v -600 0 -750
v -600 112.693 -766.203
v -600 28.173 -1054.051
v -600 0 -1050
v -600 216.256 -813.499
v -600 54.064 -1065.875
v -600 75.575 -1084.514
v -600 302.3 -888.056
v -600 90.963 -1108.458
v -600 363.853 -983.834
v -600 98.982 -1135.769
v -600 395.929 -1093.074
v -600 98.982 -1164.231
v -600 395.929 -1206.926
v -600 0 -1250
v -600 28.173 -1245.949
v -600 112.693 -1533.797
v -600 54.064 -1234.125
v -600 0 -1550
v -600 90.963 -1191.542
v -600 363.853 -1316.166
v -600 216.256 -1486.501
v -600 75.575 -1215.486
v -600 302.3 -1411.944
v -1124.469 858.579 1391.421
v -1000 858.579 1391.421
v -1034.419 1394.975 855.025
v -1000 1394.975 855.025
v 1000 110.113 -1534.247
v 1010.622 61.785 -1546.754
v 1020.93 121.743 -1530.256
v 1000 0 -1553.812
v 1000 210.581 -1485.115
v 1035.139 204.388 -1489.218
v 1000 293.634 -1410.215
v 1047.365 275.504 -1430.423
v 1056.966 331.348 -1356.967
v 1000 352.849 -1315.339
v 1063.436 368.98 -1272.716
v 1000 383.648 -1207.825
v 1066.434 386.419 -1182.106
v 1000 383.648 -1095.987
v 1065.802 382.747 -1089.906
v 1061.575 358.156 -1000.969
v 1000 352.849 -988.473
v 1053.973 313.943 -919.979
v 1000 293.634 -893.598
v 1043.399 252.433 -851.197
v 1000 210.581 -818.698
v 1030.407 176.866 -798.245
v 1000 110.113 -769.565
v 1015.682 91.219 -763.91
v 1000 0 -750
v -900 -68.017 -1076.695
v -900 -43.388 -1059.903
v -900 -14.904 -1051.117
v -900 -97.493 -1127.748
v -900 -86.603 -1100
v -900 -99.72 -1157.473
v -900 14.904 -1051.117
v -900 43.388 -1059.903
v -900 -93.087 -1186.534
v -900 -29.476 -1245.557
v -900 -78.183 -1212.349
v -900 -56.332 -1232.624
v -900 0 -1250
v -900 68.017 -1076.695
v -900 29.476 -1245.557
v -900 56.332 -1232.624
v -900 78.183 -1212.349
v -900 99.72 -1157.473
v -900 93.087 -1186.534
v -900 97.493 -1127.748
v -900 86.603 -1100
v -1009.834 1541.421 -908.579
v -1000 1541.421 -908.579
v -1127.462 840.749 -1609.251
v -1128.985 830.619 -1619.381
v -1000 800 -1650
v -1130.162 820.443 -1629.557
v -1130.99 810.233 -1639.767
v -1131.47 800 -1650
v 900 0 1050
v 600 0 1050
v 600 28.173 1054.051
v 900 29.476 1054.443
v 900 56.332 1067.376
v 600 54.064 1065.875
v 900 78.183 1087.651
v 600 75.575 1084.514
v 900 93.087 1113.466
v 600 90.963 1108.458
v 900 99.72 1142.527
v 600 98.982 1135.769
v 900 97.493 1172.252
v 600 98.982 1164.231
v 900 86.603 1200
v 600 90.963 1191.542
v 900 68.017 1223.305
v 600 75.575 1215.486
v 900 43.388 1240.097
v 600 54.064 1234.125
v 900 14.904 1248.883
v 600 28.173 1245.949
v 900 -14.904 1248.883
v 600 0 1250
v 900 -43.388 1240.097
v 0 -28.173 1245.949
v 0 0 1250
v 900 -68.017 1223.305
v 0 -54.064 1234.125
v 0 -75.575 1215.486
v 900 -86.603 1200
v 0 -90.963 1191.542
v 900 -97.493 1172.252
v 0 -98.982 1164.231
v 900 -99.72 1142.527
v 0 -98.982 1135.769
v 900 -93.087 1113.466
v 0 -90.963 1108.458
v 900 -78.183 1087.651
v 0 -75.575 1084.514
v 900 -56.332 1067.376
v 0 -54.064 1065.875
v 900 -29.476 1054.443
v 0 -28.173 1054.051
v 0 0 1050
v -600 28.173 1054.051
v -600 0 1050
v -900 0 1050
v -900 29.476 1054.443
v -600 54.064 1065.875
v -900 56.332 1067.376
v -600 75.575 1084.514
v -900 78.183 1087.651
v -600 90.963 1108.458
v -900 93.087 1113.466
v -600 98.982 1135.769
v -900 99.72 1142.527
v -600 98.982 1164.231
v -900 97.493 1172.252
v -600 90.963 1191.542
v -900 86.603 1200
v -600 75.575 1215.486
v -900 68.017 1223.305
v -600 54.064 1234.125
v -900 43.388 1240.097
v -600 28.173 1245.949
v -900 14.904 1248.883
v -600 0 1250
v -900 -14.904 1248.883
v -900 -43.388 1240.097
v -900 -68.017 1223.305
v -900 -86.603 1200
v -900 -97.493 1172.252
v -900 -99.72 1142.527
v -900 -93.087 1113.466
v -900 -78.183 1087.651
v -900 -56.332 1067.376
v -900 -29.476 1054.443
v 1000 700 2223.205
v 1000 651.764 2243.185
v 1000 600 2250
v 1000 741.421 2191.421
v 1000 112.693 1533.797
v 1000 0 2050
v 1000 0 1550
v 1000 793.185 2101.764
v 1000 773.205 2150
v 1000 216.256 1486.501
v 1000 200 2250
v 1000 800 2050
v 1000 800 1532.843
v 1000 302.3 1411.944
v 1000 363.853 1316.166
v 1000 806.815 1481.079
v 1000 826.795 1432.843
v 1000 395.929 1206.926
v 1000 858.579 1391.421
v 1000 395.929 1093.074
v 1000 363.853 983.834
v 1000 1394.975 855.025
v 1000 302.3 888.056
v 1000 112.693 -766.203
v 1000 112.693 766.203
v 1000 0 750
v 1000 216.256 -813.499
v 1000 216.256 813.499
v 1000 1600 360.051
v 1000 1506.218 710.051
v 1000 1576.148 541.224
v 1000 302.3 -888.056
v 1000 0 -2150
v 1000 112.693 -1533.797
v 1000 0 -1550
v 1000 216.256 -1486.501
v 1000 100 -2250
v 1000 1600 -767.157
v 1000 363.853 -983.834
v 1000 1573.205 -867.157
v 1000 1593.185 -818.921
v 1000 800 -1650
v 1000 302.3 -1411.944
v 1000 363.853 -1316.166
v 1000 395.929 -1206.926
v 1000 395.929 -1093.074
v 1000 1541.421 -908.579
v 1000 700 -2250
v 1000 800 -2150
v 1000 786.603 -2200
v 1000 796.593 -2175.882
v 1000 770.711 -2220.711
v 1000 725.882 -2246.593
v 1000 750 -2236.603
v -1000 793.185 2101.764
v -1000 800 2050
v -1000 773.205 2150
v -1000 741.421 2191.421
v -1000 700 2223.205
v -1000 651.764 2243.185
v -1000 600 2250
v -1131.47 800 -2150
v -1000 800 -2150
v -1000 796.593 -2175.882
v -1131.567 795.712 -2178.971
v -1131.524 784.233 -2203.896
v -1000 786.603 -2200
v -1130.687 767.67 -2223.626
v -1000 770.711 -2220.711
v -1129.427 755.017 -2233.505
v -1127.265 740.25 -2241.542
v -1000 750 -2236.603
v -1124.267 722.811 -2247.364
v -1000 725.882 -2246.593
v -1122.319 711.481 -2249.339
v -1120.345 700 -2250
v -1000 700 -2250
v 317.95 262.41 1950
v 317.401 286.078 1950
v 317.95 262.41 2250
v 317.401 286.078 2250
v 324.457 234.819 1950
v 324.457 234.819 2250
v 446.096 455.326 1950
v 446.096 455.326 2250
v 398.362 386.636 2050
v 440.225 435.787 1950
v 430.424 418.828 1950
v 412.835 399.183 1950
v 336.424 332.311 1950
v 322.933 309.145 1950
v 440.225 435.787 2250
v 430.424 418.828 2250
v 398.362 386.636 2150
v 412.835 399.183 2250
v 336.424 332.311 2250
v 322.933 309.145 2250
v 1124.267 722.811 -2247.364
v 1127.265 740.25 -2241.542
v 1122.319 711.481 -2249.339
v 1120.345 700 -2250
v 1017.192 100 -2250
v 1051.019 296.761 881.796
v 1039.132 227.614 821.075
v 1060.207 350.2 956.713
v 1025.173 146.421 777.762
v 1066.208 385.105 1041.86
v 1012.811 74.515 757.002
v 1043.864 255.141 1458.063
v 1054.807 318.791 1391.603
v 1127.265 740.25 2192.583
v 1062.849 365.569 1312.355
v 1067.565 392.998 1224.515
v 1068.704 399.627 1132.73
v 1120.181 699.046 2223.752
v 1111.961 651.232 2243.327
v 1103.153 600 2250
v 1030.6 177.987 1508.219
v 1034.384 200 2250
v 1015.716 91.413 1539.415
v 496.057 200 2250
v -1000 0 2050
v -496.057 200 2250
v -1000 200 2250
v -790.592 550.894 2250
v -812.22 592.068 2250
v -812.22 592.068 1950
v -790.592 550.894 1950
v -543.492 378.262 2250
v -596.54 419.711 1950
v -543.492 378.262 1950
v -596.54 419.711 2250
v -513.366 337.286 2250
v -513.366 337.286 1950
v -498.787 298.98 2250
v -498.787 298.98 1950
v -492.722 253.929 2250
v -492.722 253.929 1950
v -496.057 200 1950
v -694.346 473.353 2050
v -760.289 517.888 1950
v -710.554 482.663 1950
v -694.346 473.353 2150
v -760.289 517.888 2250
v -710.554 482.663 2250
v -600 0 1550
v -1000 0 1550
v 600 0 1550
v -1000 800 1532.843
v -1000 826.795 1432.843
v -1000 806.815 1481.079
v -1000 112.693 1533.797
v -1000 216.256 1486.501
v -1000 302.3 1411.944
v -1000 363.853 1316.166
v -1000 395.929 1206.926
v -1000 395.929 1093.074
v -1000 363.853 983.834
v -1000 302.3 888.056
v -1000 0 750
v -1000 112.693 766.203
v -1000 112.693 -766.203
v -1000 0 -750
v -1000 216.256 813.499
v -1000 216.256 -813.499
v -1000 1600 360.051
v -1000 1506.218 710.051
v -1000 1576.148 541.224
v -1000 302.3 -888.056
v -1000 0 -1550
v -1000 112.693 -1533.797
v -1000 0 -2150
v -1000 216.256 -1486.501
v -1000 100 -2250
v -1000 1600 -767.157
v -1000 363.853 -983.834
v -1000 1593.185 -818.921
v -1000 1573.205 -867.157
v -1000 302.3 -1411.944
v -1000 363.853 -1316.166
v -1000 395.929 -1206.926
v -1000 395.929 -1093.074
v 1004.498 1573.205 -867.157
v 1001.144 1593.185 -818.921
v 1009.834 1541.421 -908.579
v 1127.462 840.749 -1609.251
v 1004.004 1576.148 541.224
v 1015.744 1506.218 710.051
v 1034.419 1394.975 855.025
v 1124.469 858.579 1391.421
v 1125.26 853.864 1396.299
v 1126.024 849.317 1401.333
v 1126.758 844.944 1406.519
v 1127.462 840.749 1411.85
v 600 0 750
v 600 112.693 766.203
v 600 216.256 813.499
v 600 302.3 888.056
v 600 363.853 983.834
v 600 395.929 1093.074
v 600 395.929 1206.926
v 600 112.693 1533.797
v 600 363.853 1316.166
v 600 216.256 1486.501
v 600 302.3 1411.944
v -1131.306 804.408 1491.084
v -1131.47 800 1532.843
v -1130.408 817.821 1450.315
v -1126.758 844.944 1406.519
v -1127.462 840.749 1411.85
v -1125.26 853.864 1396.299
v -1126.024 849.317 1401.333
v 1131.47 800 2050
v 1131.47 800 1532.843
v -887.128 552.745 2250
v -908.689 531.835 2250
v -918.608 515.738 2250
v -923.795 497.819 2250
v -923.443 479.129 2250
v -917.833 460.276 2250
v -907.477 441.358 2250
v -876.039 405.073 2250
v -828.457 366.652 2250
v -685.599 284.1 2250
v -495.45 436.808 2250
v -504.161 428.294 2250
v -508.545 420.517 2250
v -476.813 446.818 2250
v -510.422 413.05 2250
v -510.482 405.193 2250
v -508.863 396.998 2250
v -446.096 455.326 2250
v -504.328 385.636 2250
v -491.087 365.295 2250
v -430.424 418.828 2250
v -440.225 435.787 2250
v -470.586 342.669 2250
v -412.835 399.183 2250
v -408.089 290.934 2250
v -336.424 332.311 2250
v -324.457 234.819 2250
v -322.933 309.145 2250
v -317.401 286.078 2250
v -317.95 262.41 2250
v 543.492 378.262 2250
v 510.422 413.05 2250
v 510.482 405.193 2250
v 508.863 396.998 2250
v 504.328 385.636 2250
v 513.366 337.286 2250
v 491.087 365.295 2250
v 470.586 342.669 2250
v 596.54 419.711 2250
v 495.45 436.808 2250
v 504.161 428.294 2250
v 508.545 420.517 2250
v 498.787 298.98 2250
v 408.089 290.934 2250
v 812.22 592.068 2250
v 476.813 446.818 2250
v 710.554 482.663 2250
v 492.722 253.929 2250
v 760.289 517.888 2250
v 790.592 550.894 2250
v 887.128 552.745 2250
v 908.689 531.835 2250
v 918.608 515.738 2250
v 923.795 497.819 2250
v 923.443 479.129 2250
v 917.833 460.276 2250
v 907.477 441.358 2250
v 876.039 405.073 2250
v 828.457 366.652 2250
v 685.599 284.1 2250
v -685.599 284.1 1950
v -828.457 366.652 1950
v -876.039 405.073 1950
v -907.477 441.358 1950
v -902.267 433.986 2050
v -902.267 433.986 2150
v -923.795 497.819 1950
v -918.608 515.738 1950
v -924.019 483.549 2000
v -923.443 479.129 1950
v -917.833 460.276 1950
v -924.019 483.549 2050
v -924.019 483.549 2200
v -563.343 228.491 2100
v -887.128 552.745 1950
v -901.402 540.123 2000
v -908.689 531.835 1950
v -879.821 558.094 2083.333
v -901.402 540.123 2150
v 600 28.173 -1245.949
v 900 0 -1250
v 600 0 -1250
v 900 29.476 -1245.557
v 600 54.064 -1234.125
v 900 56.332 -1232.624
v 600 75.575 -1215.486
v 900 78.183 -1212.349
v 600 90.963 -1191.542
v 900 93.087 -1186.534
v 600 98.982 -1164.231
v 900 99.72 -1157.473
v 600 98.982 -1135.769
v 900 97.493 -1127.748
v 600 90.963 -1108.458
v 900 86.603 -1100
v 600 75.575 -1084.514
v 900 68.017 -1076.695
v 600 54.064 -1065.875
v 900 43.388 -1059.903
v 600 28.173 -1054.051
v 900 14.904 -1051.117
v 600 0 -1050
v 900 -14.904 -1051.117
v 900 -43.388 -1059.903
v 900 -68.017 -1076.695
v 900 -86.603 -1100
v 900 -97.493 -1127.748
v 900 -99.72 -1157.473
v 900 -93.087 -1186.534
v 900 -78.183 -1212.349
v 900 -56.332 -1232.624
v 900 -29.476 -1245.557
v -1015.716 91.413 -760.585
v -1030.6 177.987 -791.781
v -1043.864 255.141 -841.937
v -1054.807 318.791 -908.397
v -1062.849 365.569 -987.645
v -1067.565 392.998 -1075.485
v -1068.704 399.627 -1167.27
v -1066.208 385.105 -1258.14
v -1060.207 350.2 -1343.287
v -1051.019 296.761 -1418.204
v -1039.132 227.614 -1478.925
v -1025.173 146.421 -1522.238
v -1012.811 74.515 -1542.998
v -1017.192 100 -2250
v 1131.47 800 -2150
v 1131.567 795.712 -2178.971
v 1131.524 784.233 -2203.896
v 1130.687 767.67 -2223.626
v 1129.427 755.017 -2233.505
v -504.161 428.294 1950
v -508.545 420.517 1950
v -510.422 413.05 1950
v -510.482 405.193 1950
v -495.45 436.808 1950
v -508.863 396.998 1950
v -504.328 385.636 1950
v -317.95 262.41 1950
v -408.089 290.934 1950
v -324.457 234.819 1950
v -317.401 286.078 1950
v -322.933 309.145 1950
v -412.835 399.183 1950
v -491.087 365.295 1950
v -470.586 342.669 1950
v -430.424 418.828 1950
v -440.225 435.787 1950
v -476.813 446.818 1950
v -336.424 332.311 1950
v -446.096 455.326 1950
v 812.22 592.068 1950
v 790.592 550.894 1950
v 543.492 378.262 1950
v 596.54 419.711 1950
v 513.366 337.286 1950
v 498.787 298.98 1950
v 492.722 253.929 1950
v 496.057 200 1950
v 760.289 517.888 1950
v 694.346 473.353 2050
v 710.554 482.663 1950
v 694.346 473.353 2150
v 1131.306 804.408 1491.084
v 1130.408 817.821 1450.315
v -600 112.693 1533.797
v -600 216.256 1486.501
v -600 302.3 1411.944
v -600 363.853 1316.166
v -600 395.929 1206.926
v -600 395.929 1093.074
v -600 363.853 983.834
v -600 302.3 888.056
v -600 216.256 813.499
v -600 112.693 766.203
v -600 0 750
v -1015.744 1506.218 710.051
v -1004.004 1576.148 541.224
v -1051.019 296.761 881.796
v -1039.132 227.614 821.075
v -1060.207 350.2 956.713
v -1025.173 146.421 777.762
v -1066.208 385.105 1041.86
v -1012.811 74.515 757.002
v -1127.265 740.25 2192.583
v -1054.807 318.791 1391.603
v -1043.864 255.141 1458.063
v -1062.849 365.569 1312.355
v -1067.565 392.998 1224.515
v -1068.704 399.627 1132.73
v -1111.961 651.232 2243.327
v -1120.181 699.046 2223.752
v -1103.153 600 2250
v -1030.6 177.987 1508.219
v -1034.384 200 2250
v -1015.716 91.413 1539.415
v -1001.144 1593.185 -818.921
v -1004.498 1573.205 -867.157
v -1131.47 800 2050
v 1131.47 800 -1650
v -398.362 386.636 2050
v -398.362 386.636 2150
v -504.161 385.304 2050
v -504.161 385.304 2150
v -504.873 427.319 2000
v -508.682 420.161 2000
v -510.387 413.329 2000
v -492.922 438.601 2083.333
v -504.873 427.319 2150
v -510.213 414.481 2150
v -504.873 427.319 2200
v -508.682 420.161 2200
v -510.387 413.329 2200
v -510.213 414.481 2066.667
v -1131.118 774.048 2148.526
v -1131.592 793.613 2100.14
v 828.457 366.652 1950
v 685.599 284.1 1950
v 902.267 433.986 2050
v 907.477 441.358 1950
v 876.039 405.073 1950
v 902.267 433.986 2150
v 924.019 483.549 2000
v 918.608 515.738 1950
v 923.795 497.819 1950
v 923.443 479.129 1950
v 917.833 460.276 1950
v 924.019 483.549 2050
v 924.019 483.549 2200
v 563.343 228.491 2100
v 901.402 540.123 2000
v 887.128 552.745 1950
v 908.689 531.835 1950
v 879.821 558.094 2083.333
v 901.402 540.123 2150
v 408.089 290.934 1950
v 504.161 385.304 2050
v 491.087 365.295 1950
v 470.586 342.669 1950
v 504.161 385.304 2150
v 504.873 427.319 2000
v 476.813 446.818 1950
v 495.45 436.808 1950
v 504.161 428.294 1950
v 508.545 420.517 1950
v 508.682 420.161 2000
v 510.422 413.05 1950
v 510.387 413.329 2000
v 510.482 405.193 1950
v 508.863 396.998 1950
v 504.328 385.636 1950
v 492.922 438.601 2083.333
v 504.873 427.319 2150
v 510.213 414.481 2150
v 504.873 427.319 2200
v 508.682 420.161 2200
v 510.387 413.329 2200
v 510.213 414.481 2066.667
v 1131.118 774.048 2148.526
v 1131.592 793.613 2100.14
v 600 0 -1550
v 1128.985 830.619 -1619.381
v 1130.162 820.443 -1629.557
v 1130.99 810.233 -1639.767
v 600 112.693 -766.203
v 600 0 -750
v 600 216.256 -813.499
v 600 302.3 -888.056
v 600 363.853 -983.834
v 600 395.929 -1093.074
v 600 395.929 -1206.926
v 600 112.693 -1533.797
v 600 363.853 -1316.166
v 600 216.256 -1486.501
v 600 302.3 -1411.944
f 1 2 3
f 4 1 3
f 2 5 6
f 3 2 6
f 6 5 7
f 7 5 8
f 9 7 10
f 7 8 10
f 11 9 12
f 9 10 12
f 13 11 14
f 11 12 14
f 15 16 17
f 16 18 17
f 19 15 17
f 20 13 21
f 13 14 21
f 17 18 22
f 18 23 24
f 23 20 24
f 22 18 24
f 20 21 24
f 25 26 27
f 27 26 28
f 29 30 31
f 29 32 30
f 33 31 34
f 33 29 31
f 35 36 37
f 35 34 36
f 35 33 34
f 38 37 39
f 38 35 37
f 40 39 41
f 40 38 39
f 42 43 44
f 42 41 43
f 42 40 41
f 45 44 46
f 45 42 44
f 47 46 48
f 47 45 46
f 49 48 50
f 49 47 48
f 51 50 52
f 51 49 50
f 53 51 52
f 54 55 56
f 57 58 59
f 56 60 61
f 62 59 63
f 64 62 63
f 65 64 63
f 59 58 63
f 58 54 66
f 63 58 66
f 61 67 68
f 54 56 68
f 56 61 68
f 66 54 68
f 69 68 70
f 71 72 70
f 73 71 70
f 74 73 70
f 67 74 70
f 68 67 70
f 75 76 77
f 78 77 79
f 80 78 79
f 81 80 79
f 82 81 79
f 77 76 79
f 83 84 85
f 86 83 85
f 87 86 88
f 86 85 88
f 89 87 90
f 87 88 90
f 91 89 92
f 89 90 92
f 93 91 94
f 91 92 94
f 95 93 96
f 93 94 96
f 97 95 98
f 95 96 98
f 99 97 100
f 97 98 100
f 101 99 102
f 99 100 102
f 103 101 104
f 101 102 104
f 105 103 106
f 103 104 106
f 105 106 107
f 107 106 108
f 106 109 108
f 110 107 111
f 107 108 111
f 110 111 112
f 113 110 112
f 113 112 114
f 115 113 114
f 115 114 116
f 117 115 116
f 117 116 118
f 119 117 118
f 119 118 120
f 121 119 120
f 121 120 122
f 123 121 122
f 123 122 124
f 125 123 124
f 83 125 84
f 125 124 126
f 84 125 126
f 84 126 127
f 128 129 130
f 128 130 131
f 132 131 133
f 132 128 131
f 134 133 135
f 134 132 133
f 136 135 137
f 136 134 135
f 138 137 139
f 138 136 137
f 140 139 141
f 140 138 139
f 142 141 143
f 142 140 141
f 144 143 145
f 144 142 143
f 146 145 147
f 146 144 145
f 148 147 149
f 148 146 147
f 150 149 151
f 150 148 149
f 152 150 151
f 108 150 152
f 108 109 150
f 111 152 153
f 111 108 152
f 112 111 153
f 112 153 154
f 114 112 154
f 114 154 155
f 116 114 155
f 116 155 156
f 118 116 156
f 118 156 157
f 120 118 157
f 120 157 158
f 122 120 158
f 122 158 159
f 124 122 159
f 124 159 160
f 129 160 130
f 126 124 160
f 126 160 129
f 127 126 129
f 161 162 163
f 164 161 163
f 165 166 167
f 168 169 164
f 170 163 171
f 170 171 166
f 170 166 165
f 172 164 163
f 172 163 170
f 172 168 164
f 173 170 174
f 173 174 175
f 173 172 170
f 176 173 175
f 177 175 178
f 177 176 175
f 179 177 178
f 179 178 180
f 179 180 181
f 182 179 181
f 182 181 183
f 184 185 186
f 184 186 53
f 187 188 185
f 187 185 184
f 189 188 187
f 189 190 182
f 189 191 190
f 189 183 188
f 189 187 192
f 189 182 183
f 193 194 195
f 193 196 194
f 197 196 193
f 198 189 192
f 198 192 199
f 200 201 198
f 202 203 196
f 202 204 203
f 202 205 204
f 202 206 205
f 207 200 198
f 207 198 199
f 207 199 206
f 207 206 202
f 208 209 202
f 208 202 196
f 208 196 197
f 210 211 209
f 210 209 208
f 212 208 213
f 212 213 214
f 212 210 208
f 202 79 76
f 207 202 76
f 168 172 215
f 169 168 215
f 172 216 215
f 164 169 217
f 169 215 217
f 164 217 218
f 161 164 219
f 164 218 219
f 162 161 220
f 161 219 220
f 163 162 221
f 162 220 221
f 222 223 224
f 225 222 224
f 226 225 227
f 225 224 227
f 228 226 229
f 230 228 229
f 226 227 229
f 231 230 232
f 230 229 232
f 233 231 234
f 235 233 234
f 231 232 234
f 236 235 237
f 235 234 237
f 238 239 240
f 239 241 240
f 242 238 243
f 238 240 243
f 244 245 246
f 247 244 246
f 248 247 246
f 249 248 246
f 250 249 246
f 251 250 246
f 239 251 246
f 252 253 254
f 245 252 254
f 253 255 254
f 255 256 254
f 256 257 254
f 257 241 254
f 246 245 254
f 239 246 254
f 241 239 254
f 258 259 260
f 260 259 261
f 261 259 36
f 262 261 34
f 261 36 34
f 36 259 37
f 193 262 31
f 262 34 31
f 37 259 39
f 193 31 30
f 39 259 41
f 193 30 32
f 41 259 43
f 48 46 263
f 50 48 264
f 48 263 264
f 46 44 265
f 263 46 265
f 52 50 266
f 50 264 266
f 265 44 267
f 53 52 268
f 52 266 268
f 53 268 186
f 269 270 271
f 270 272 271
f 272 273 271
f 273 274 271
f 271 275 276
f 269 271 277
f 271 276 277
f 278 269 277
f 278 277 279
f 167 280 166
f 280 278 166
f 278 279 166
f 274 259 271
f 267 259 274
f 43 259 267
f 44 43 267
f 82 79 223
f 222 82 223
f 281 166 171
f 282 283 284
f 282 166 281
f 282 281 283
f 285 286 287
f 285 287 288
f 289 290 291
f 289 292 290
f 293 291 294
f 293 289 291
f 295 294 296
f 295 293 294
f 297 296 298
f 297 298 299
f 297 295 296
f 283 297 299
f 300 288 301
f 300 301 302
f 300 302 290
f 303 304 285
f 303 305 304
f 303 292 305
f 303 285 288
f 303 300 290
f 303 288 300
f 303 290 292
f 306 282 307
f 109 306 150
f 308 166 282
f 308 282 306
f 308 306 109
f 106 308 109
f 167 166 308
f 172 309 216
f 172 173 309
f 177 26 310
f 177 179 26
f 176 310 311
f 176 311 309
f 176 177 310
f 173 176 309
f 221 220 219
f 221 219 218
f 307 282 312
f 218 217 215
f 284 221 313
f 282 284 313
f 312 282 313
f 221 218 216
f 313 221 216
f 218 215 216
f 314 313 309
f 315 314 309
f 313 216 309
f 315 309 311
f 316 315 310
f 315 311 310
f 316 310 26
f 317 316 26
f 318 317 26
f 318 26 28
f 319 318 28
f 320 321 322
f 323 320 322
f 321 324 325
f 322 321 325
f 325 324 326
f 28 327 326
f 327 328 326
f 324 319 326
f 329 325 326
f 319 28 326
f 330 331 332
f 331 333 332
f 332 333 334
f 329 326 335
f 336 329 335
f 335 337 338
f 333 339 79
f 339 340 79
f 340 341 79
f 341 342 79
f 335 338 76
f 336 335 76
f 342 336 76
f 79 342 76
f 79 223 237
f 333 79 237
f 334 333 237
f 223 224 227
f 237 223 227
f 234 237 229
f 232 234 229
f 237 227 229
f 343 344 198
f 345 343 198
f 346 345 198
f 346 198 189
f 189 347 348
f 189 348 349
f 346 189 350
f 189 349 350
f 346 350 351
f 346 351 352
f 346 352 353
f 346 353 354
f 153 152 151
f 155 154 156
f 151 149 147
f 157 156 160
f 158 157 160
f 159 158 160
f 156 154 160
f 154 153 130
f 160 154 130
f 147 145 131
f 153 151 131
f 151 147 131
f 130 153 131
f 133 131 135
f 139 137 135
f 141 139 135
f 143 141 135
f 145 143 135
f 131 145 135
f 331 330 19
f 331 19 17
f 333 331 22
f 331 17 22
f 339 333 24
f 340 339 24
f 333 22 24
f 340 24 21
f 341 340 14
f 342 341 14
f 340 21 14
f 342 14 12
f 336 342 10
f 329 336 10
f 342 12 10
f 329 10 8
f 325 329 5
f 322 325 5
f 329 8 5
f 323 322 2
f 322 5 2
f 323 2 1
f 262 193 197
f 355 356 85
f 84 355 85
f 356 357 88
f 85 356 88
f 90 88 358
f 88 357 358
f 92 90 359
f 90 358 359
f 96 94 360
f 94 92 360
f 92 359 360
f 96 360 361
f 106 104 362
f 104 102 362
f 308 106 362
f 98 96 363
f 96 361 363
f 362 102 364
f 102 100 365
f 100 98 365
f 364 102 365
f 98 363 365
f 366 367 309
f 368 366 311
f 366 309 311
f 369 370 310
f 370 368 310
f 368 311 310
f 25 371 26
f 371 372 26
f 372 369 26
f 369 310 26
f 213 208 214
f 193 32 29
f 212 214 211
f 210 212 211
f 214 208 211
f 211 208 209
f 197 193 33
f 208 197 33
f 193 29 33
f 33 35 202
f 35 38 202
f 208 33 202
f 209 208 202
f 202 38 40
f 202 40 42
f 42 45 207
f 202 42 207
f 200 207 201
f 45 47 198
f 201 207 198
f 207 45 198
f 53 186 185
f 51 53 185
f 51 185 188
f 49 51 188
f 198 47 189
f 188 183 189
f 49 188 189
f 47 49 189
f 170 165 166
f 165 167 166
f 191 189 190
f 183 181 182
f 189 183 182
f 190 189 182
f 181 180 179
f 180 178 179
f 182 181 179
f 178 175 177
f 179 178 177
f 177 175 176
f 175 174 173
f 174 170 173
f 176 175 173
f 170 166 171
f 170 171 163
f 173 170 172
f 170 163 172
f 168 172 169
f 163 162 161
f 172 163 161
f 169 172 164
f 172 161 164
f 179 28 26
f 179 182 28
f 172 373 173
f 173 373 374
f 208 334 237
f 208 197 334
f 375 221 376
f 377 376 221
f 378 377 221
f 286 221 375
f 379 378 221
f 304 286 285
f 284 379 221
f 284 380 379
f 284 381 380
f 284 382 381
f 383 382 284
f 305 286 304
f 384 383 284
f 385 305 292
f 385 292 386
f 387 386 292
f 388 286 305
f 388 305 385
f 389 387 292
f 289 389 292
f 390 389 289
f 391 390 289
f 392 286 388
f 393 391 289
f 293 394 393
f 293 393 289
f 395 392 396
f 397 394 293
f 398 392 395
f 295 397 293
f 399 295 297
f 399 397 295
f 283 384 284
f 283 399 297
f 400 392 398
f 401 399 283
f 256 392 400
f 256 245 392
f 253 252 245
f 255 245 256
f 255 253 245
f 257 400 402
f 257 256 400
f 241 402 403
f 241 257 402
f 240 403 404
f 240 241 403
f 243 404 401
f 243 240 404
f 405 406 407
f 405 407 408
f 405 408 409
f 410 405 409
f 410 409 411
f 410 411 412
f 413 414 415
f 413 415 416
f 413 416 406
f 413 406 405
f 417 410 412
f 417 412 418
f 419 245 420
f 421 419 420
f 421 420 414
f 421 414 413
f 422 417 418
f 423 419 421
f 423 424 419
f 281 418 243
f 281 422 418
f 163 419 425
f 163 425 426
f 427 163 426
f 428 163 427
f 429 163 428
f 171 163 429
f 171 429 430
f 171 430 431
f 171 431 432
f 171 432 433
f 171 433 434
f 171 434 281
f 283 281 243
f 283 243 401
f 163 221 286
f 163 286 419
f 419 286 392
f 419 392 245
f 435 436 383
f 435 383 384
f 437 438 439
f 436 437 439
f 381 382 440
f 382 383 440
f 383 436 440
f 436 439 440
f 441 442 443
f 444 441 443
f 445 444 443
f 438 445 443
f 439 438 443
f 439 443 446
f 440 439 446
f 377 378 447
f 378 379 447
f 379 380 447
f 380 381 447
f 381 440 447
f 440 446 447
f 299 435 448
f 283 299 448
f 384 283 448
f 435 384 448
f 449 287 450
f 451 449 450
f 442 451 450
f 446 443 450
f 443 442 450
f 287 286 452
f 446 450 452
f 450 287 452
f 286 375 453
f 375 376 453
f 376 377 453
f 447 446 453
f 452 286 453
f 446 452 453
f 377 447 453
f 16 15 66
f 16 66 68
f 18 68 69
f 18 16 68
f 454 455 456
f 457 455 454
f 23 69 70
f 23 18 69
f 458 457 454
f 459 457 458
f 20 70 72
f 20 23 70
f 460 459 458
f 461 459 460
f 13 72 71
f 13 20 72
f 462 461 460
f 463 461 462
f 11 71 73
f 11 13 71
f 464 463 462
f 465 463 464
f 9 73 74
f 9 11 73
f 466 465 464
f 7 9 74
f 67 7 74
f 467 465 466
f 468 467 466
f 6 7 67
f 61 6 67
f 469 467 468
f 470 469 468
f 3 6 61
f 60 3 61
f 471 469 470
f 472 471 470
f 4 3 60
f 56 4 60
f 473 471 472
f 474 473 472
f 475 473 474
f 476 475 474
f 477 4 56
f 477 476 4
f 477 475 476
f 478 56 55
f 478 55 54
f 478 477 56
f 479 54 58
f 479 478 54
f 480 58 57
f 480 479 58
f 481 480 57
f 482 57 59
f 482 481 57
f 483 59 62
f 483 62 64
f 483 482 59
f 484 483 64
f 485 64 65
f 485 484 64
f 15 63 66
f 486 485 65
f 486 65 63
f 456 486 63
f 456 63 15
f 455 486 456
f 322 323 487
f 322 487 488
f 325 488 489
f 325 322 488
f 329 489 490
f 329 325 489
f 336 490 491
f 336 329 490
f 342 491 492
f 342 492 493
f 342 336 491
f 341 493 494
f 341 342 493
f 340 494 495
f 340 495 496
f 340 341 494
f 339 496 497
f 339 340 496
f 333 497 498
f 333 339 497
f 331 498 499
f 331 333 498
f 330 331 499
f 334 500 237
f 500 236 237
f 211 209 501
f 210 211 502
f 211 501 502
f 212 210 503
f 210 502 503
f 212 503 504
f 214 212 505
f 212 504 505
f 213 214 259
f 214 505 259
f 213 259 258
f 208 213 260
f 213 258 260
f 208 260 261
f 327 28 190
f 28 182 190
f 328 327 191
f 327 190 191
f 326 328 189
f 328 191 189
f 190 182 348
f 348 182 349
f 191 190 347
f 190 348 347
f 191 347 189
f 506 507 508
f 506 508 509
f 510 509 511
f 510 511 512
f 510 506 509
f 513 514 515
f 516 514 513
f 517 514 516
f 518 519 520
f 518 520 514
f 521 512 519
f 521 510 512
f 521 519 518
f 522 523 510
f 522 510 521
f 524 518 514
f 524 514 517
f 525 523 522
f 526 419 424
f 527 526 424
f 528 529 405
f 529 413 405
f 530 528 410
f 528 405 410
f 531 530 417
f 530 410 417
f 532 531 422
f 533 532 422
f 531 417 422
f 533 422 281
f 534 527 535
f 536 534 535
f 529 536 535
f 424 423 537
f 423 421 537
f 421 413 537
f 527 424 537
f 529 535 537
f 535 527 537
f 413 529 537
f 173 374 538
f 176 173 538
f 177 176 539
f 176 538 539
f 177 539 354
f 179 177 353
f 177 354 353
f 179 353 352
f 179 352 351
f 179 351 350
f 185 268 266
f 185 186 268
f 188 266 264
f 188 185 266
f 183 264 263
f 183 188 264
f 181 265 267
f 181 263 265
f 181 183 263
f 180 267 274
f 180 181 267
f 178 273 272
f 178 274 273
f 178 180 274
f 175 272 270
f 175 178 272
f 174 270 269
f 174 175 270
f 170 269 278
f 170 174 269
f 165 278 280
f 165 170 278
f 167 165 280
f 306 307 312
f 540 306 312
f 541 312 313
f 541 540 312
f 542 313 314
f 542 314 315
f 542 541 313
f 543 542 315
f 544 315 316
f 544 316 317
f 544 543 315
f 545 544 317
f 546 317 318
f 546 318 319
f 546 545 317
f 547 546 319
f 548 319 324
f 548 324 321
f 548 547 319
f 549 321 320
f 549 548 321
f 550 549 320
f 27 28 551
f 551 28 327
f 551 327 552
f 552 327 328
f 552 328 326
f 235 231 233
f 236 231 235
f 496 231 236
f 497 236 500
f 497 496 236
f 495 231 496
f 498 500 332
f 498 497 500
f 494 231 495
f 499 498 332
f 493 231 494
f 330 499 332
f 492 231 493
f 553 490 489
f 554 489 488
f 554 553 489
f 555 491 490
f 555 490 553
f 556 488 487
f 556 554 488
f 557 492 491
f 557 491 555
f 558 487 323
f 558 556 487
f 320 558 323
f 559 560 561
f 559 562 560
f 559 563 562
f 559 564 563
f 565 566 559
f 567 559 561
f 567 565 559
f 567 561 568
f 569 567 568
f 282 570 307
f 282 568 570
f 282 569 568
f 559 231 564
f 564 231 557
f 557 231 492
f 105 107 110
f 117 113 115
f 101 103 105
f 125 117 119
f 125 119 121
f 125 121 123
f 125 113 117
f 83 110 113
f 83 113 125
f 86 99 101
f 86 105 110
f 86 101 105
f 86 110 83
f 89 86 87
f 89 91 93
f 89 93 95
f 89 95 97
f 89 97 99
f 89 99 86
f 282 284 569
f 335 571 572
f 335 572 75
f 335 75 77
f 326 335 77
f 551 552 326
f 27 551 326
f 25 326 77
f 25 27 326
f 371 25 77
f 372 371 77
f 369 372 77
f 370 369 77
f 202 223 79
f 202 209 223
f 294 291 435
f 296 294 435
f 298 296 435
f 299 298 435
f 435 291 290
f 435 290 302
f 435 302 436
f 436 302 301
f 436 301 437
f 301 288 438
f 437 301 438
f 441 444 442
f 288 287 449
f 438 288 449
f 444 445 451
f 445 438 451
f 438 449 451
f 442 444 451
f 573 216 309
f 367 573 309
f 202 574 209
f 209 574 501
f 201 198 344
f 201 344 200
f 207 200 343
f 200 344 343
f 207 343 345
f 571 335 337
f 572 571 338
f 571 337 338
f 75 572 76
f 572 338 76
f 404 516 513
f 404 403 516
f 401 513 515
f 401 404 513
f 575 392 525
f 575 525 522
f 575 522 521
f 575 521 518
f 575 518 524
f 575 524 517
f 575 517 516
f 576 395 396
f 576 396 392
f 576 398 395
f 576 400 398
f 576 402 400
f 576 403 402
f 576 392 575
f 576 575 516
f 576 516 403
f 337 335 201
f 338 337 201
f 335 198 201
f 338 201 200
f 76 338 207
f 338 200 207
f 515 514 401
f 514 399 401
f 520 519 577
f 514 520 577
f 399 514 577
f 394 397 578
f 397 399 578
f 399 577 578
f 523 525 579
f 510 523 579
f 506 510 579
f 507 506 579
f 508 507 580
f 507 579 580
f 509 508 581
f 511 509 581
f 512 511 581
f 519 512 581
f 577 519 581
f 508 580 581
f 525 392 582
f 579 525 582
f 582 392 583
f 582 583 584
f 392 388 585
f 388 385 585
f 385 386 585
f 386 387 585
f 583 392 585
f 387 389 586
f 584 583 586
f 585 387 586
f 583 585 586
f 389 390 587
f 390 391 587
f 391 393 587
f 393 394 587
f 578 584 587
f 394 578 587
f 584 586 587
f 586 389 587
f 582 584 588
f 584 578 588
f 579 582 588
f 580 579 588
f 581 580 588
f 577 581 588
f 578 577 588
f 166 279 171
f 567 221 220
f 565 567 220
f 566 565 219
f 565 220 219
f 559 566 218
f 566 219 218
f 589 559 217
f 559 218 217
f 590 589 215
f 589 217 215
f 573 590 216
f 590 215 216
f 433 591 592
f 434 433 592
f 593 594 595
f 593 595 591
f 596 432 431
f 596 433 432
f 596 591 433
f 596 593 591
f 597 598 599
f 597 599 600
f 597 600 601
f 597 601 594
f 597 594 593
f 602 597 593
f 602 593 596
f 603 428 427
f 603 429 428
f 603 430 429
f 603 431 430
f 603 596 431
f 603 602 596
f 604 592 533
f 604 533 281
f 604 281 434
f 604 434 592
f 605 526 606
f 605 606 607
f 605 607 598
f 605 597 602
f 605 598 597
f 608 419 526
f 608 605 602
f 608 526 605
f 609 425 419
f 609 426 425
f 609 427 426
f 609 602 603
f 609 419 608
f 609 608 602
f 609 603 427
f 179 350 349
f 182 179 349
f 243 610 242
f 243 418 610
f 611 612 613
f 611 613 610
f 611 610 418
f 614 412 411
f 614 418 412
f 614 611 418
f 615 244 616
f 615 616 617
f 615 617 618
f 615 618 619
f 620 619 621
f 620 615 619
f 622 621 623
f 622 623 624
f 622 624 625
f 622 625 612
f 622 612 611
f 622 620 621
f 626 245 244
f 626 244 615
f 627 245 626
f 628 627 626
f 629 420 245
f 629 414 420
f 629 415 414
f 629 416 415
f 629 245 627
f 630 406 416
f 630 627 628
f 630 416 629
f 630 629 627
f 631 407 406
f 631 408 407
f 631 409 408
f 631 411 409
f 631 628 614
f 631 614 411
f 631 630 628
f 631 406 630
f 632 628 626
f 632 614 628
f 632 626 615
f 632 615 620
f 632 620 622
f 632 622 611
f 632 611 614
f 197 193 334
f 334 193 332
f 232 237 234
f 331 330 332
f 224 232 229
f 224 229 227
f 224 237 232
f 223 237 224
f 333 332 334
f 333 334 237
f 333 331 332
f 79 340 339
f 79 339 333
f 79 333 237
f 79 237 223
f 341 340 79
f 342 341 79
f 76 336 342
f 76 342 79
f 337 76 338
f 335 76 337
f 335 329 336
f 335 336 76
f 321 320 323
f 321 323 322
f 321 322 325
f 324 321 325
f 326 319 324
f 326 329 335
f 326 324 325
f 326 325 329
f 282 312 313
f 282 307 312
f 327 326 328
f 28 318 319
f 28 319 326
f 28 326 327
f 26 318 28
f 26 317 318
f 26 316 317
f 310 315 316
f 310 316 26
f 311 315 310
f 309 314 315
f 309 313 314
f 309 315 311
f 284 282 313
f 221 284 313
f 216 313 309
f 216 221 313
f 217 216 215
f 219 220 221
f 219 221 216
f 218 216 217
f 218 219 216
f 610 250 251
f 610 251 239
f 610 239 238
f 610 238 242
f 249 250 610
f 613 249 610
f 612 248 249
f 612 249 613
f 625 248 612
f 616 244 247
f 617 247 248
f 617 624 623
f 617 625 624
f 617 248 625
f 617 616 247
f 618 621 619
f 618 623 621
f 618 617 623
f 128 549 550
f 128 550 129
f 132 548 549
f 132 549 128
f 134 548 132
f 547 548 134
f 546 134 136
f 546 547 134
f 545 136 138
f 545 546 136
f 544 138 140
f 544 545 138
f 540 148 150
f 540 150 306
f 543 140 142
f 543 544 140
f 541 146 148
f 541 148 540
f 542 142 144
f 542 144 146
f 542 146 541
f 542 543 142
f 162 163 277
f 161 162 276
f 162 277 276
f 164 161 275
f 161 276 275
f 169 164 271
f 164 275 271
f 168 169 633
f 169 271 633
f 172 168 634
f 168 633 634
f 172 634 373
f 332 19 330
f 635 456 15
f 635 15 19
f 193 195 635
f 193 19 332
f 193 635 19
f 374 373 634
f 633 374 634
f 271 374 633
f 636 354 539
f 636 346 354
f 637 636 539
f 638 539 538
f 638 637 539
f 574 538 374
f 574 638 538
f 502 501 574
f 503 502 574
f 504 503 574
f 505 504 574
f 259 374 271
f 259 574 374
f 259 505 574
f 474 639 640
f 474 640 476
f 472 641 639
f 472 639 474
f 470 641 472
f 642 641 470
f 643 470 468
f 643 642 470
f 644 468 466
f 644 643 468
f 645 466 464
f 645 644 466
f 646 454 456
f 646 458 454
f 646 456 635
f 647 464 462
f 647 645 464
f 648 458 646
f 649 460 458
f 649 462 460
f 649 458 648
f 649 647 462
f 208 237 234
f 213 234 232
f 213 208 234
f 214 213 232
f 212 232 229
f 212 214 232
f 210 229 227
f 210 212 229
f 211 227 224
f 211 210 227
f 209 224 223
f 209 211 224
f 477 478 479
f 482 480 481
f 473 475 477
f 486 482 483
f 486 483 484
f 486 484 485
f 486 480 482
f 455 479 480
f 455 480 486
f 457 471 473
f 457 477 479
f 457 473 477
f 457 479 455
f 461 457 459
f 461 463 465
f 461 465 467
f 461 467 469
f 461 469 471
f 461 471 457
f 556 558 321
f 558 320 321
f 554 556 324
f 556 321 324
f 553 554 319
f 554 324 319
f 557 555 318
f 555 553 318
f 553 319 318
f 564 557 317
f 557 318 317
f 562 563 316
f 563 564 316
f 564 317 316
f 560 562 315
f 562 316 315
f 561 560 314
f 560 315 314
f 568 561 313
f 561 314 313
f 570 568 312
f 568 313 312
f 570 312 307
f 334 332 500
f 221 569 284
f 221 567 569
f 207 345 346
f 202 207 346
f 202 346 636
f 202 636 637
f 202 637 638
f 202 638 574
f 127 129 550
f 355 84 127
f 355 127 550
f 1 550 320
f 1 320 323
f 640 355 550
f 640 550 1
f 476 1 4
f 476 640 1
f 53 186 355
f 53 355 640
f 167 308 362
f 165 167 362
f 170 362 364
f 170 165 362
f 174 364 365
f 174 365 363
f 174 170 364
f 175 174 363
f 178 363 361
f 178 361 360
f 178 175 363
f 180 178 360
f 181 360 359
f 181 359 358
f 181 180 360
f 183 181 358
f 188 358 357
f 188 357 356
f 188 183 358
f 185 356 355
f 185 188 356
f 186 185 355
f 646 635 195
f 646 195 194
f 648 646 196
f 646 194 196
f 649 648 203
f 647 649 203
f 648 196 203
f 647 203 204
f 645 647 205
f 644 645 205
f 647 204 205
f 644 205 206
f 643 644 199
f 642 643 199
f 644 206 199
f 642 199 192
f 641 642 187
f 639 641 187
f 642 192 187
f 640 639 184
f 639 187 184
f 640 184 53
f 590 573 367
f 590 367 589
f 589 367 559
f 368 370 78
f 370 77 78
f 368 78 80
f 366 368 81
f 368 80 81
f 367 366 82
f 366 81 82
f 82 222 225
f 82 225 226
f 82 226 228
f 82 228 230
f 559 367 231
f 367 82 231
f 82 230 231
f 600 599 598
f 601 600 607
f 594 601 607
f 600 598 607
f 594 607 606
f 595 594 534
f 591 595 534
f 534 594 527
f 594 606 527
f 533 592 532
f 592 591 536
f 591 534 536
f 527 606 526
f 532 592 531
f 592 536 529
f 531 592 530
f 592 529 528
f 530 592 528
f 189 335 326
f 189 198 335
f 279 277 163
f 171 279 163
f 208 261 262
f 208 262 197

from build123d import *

# Parameters (mm, degrees)
BOSS_EXTRUDE1_DEPTH     = 1000
FILLET1_R               = 700
FILLET2_R               = 200
FILLET3_R               = 200
FILLET4_R               = 200
CHAMFER1_SIZE           = 200
FILLET5_R               = 100
CHAMFER2_SIZE           = 100
CUT_EXTRUDE3_DEPTH      = 400
CUT_EXTRUDE4_START      = -400
CUT_EXTRUDE4_DEPTH      = 400
SKETCH7_R               = 100
BOSS_EXTRUDE2_DEPTH     = 900
CUT_EXTRUDE6_DEPTH      = 300
BOSS_EXTRUDE3_DEPTH     = 4500
BOSS_EXTRUDE3_2_DEPTH   = 4500
CUT_EXTRUDE7_DEPTH      = 3491.640611961
CUT_EXTRUDE7_DEPTH_BACK = 3491.640611961
FILLET6_R               = 300
FILLET7_R               = 300
CUT_EXTRUDE8_DEPTH      = 3489.01206024
CUT_EXTRUDE9_DEPTH      = 3489.01206024


with BuildPart() as part:
    # Car_Profile → Boss-Extrude1 (new, symmetric)
    with BuildSketch(Plane(origin=(0, 0, 0), x_dir=(0, 0, -1), z_dir=(1, 0, 0))):
        Polygon((2250, 0), (2250, 800), (1650, 800), (850, 1600), (-650, 1600), (-1450, 800), (-2250, 800), (-2250, 0), align=None)
    extrude(amount=BOSS_EXTRUDE1_DEPTH, both=True)

    # Fillet1
    fillet1_edges = [part.edges().sort_by_distance(p)[0] for p in [
        (0, 1600, 650),
    ]]
    fillet(fillet1_edges, radius=FILLET1_R)

    # Fillet2
    fillet2_edges = [part.edges().sort_by_distance(p)[0] for p in [
        (0, 1600, -850),
    ]]
    fillet(fillet2_edges, radius=FILLET2_R)

    # Fillet3
    fillet3_edges = [part.edges().sort_by_distance(p)[0] for p in [
        (0, 800, 1450),
    ]]
    fillet(fillet3_edges, radius=FILLET3_R)

    # Fillet4
    fillet4_edges = [part.edges().sort_by_distance(p)[0] for p in [
        (0, 800, 2250),
    ]]
    fillet(fillet4_edges, radius=FILLET4_R)

    # Chamfer1
    chamfer1_edges = [part.edges().sort_by_distance(p)[0] for p in [
        (0, 0, 2250),
    ]]
    chamfer(chamfer1_edges, length=CHAMFER1_SIZE)

    # Fillet5
    fillet5_edges = [part.edges().sort_by_distance(p)[0] for p in [
        (0, 800, -2250),
    ]]
    fillet(fillet5_edges, radius=FILLET5_R)

    # Chamfer2
    chamfer2_edges = [part.edges().sort_by_distance(p)[0] for p in [
        (0, 0, -2250),
    ]]
    chamfer(chamfer2_edges, length=CHAMFER2_SIZE)

    # Sketch4 → Cut-Extrude3 (cut)
    with BuildSketch(Plane(origin=(1000, 0, 0), x_dir=(0, 0, -1), z_dir=(1, 0, 0))):
        with BuildLine():
            Line((-750, 0), (-1550, 0))
            ThreePointArc((-1550, 0), (-1150, 400), (-750, 0))
        make_face()
        with BuildLine():
            Line((750, 0), (1550, 0))
            ThreePointArc((1550, 0), (1150, 400), (750, 0))
        make_face()
    extrude(amount=-CUT_EXTRUDE3_DEPTH, mode=Mode.SUBTRACT)

    # Sketch6 → Cut-Extrude4 (cut)
    with BuildSketch(Plane.ZY.offset(1000).offset(CUT_EXTRUDE4_START)):
        with BuildLine():
            Line((-750, 0), (-1550, 0))
            ThreePointArc((-1550, 0), (-1150, 400), (-750, 0))
        make_face()
        with BuildLine():
            Line((750, 0), (1550, 0))
            ThreePointArc((1550, 0), (1150, 400), (750, 0))
        make_face()
    extrude(amount=CUT_EXTRUDE4_DEPTH, mode=Mode.SUBTRACT)

    # Sketch7 → Boss-Extrude2 (add, symmetric)
    with BuildSketch(Plane(origin=(0, 0, 0), x_dir=(0, 0, -1), z_dir=(1, 0, 0))):
        with Locations((-1150, 0)):
            Circle(SKETCH7_R)
        with Locations((1150, 0)):
            Circle(SKETCH7_R)
    extrude(amount=BOSS_EXTRUDE2_DEPTH, both=True)

    # Sketch3 → Cut-Extrude6 (cut)
    with BuildSketch(Plane.XY.offset(2250)):
        with BuildLine():
            add(Edge.make_bspline(
                [(-812.220424377, 592.068401543), (-750.671179112, 420.314312551), (-457.577758575, 466.704189274), (-496.056589451, 200)],
                knots=[0, 0, 0, 0, 1, 1, 1, 1], degree=3))
            add(Edge.make_bspline(
                [(-812.220424377, 592.068401543), (-1175.602480819, 453.360293498), (-543.357650564, 223.458106016), (-496.056589451, 200)],
                knots=[0, 0, 0, 0, 1, 1, 1, 1], degree=3))
        make_face()
        with BuildLine():
            add(Edge.make_bspline(
                [(-446.096477938, 455.326051812), (-637.070416277, 418.575957657), (-345.711658908, 250.477148017), (-324.457161733, 234.819414147)],
                knots=[0, 0, 0, 0, 1, 1, 1, 1], degree=3))
            add(Edge.make_bspline(
                [(-446.096477938, 455.326051812), (-430.701783253, 365.409715448), (-282.353688025, 362.804701396), (-324.457161733, 234.819414147)],
                knots=[0, 0, 0, 0, 1, 1, 1, 1], degree=3))
        make_face()
        with BuildLine():
            add(Edge.make_bspline(
                [(446.096477938, 455.326051812), (430.701783253, 365.409715448), (282.353688025, 362.804701396), (324.457161733, 234.819414147)],
                knots=[0, 0, 0, 0, 1, 1, 1, 1], degree=3))
            add(Edge.make_bspline(
                [(446.096477938, 455.326051812), (637.070416277, 418.575957657), (345.711658908, 250.477148017), (324.457161733, 234.819414147)],
                knots=[0, 0, 0, 0, 1, 1, 1, 1], degree=3))
        make_face()
        with BuildLine():
            add(Edge.make_bspline(
                [(812.220424377, 592.068401543), (1175.602480819, 453.360293498), (543.357650564, 223.458106016), (496.056589451, 200)],
                knots=[0, 0, 0, 0, 1, 1, 1, 1], degree=3))
            add(Edge.make_bspline(
                [(812.220424377, 592.068401543), (750.671179112, 420.314312551), (457.577758575, 466.704189274), (496.056589451, 200)],
                knots=[0, 0, 0, 0, 1, 1, 1, 1], degree=3))
        make_face()
    extrude(amount=-CUT_EXTRUDE6_DEPTH, mode=Mode.SUBTRACT)


with BuildPart() as body_2:
    # Sketch8 → Boss-Extrude3 (new body)
    with BuildSketch(Plane.XY.offset(2250)):
        Polygon((-1000, 0), (-1000, 1600), (-1135.900718999, 790.482834849), align=None)
    extrude(amount=-BOSS_EXTRUDE3_DEPTH)


with BuildPart() as body_3:
    # Sketch8 → Boss-Extrude3 2 (new body)
    with BuildSketch(Plane.XY.offset(2250)):
        Polygon((1000, 1600), (1135.900718999, 790.482834849), (1000, 0), align=None)
    extrude(amount=-BOSS_EXTRUDE3_2_DEPTH)


with BuildPart() as cut_extrude7_tool:
    # Sketch9 → Cut-Extrude7 (new, two sides: drawn at the far end of the back side and taken through both)
    with BuildSketch(Plane.ZY.offset(-1000).offset(-CUT_EXTRUDE7_DEPTH_BACK)):
        with BuildLine():
            Line((-2250, 700), (-2250, 1600))
            Line((-2250, 1600), (-767.157287525, 1600))
            ThreePointArc((-767.157287525, 1600), (-843.693973998, 1584.775906502), (-908.578643763, 1541.421356237))
            Line((-908.578643763, 1541.421356237), (-1650, 800))
            Line((-1650, 800), (-2150, 800))
            ThreePointArc((-2150, 800), (-2220.710678119, 770.710678119), (-2250, 700))
        make_face()
        with BuildLine():
            Line((2050, 800), (1532.842712475, 800))
            ThreePointArc((1532.842712475, 800), (1456.306026002, 815.224093498), (1391.421356237, 858.578643763))
            Line((1391.421356237, 858.578643763), (855.025253169, 1394.974746831))
            ThreePointArc((855.025253169, 1394.974746831), (627.928908994, 1546.715672758), (360.050506339, 1600))
            Line((360.050506339, 1600), (2250, 1600))
            Line((2250, 1600), (2250, 600))
            ThreePointArc((2250, 600), (2191.421356237, 741.421356237), (2050, 800))
        make_face()
        Polygon((2250, 200), (2050, 0), (2250, 0), align=None)
        Polygon((-2250, 100), (-2250, 0), (-2150, 0), align=None)
    extrude(amount=CUT_EXTRUDE7_DEPTH + CUT_EXTRUDE7_DEPTH_BACK)


with BuildPart() as body_2_1:
    add(body_2.part)

    # Cut-Extrude7: cut by cut_extrude7_tool
    add(cut_extrude7_tool.part, mode=Mode.SUBTRACT)

    # Fillet6
    fillet6_edges = [body_2_1.edges().sort_by_distance(p)[0] for p in [
        (-1135.900718999, 790.482834849, -40.808137785),
    ]]
    fillet(fillet6_edges, radius=FILLET6_R)

    # Sketch10 → Cut-Extrude8 (cut, through all)
    with BuildSketch(Plane(origin=(-1000, 0, 0), x_dir=(0, 0, -1), z_dir=(1, 0, 0))):
        with BuildLine():
            Line((-1550, 0), (-750, 0))
            ThreePointArc((-750, 0), (-1150, 400), (-1550, 0))
        make_face()
        with BuildLine():
            Line((1550, 0), (750, 0))
            ThreePointArc((750, 0), (1150, 400), (1550, 0))
        make_face()
    extrude(amount=-CUT_EXTRUDE8_DEPTH, mode=Mode.SUBTRACT)


with BuildPart() as body_3_1:
    add(body_3.part)

    # Cut-Extrude7: cut by cut_extrude7_tool
    add(cut_extrude7_tool.part, mode=Mode.SUBTRACT)

    # Fillet7
    fillet7_edges = [body_3_1.edges().sort_by_distance(p)[0] for p in [
        (1135.900718999, 790.482834849, -40.808137785),
    ]]
    fillet(fillet7_edges, radius=FILLET7_R)

    # Sketch11 → Cut-Extrude9 (cut, through all)
    with BuildSketch(Plane.ZY.offset(-1000)):
        with BuildLine():
            Line((1550, 0), (750, 0))
            ThreePointArc((750, 0), (1150, 400), (1550, 0))
        make_face()
        with BuildLine():
            Line((-750, 0), (-1553.812431016, 0))
            ThreePointArc((-1553.812431016, 0), (-1151.906215508, 387.554495198), (-750, 0))
        make_face()
    extrude(amount=-CUT_EXTRUDE9_DEPTH, mode=Mode.SUBTRACT)


solid = Compound([part.part, body_2_1.part, body_3_1.part])
